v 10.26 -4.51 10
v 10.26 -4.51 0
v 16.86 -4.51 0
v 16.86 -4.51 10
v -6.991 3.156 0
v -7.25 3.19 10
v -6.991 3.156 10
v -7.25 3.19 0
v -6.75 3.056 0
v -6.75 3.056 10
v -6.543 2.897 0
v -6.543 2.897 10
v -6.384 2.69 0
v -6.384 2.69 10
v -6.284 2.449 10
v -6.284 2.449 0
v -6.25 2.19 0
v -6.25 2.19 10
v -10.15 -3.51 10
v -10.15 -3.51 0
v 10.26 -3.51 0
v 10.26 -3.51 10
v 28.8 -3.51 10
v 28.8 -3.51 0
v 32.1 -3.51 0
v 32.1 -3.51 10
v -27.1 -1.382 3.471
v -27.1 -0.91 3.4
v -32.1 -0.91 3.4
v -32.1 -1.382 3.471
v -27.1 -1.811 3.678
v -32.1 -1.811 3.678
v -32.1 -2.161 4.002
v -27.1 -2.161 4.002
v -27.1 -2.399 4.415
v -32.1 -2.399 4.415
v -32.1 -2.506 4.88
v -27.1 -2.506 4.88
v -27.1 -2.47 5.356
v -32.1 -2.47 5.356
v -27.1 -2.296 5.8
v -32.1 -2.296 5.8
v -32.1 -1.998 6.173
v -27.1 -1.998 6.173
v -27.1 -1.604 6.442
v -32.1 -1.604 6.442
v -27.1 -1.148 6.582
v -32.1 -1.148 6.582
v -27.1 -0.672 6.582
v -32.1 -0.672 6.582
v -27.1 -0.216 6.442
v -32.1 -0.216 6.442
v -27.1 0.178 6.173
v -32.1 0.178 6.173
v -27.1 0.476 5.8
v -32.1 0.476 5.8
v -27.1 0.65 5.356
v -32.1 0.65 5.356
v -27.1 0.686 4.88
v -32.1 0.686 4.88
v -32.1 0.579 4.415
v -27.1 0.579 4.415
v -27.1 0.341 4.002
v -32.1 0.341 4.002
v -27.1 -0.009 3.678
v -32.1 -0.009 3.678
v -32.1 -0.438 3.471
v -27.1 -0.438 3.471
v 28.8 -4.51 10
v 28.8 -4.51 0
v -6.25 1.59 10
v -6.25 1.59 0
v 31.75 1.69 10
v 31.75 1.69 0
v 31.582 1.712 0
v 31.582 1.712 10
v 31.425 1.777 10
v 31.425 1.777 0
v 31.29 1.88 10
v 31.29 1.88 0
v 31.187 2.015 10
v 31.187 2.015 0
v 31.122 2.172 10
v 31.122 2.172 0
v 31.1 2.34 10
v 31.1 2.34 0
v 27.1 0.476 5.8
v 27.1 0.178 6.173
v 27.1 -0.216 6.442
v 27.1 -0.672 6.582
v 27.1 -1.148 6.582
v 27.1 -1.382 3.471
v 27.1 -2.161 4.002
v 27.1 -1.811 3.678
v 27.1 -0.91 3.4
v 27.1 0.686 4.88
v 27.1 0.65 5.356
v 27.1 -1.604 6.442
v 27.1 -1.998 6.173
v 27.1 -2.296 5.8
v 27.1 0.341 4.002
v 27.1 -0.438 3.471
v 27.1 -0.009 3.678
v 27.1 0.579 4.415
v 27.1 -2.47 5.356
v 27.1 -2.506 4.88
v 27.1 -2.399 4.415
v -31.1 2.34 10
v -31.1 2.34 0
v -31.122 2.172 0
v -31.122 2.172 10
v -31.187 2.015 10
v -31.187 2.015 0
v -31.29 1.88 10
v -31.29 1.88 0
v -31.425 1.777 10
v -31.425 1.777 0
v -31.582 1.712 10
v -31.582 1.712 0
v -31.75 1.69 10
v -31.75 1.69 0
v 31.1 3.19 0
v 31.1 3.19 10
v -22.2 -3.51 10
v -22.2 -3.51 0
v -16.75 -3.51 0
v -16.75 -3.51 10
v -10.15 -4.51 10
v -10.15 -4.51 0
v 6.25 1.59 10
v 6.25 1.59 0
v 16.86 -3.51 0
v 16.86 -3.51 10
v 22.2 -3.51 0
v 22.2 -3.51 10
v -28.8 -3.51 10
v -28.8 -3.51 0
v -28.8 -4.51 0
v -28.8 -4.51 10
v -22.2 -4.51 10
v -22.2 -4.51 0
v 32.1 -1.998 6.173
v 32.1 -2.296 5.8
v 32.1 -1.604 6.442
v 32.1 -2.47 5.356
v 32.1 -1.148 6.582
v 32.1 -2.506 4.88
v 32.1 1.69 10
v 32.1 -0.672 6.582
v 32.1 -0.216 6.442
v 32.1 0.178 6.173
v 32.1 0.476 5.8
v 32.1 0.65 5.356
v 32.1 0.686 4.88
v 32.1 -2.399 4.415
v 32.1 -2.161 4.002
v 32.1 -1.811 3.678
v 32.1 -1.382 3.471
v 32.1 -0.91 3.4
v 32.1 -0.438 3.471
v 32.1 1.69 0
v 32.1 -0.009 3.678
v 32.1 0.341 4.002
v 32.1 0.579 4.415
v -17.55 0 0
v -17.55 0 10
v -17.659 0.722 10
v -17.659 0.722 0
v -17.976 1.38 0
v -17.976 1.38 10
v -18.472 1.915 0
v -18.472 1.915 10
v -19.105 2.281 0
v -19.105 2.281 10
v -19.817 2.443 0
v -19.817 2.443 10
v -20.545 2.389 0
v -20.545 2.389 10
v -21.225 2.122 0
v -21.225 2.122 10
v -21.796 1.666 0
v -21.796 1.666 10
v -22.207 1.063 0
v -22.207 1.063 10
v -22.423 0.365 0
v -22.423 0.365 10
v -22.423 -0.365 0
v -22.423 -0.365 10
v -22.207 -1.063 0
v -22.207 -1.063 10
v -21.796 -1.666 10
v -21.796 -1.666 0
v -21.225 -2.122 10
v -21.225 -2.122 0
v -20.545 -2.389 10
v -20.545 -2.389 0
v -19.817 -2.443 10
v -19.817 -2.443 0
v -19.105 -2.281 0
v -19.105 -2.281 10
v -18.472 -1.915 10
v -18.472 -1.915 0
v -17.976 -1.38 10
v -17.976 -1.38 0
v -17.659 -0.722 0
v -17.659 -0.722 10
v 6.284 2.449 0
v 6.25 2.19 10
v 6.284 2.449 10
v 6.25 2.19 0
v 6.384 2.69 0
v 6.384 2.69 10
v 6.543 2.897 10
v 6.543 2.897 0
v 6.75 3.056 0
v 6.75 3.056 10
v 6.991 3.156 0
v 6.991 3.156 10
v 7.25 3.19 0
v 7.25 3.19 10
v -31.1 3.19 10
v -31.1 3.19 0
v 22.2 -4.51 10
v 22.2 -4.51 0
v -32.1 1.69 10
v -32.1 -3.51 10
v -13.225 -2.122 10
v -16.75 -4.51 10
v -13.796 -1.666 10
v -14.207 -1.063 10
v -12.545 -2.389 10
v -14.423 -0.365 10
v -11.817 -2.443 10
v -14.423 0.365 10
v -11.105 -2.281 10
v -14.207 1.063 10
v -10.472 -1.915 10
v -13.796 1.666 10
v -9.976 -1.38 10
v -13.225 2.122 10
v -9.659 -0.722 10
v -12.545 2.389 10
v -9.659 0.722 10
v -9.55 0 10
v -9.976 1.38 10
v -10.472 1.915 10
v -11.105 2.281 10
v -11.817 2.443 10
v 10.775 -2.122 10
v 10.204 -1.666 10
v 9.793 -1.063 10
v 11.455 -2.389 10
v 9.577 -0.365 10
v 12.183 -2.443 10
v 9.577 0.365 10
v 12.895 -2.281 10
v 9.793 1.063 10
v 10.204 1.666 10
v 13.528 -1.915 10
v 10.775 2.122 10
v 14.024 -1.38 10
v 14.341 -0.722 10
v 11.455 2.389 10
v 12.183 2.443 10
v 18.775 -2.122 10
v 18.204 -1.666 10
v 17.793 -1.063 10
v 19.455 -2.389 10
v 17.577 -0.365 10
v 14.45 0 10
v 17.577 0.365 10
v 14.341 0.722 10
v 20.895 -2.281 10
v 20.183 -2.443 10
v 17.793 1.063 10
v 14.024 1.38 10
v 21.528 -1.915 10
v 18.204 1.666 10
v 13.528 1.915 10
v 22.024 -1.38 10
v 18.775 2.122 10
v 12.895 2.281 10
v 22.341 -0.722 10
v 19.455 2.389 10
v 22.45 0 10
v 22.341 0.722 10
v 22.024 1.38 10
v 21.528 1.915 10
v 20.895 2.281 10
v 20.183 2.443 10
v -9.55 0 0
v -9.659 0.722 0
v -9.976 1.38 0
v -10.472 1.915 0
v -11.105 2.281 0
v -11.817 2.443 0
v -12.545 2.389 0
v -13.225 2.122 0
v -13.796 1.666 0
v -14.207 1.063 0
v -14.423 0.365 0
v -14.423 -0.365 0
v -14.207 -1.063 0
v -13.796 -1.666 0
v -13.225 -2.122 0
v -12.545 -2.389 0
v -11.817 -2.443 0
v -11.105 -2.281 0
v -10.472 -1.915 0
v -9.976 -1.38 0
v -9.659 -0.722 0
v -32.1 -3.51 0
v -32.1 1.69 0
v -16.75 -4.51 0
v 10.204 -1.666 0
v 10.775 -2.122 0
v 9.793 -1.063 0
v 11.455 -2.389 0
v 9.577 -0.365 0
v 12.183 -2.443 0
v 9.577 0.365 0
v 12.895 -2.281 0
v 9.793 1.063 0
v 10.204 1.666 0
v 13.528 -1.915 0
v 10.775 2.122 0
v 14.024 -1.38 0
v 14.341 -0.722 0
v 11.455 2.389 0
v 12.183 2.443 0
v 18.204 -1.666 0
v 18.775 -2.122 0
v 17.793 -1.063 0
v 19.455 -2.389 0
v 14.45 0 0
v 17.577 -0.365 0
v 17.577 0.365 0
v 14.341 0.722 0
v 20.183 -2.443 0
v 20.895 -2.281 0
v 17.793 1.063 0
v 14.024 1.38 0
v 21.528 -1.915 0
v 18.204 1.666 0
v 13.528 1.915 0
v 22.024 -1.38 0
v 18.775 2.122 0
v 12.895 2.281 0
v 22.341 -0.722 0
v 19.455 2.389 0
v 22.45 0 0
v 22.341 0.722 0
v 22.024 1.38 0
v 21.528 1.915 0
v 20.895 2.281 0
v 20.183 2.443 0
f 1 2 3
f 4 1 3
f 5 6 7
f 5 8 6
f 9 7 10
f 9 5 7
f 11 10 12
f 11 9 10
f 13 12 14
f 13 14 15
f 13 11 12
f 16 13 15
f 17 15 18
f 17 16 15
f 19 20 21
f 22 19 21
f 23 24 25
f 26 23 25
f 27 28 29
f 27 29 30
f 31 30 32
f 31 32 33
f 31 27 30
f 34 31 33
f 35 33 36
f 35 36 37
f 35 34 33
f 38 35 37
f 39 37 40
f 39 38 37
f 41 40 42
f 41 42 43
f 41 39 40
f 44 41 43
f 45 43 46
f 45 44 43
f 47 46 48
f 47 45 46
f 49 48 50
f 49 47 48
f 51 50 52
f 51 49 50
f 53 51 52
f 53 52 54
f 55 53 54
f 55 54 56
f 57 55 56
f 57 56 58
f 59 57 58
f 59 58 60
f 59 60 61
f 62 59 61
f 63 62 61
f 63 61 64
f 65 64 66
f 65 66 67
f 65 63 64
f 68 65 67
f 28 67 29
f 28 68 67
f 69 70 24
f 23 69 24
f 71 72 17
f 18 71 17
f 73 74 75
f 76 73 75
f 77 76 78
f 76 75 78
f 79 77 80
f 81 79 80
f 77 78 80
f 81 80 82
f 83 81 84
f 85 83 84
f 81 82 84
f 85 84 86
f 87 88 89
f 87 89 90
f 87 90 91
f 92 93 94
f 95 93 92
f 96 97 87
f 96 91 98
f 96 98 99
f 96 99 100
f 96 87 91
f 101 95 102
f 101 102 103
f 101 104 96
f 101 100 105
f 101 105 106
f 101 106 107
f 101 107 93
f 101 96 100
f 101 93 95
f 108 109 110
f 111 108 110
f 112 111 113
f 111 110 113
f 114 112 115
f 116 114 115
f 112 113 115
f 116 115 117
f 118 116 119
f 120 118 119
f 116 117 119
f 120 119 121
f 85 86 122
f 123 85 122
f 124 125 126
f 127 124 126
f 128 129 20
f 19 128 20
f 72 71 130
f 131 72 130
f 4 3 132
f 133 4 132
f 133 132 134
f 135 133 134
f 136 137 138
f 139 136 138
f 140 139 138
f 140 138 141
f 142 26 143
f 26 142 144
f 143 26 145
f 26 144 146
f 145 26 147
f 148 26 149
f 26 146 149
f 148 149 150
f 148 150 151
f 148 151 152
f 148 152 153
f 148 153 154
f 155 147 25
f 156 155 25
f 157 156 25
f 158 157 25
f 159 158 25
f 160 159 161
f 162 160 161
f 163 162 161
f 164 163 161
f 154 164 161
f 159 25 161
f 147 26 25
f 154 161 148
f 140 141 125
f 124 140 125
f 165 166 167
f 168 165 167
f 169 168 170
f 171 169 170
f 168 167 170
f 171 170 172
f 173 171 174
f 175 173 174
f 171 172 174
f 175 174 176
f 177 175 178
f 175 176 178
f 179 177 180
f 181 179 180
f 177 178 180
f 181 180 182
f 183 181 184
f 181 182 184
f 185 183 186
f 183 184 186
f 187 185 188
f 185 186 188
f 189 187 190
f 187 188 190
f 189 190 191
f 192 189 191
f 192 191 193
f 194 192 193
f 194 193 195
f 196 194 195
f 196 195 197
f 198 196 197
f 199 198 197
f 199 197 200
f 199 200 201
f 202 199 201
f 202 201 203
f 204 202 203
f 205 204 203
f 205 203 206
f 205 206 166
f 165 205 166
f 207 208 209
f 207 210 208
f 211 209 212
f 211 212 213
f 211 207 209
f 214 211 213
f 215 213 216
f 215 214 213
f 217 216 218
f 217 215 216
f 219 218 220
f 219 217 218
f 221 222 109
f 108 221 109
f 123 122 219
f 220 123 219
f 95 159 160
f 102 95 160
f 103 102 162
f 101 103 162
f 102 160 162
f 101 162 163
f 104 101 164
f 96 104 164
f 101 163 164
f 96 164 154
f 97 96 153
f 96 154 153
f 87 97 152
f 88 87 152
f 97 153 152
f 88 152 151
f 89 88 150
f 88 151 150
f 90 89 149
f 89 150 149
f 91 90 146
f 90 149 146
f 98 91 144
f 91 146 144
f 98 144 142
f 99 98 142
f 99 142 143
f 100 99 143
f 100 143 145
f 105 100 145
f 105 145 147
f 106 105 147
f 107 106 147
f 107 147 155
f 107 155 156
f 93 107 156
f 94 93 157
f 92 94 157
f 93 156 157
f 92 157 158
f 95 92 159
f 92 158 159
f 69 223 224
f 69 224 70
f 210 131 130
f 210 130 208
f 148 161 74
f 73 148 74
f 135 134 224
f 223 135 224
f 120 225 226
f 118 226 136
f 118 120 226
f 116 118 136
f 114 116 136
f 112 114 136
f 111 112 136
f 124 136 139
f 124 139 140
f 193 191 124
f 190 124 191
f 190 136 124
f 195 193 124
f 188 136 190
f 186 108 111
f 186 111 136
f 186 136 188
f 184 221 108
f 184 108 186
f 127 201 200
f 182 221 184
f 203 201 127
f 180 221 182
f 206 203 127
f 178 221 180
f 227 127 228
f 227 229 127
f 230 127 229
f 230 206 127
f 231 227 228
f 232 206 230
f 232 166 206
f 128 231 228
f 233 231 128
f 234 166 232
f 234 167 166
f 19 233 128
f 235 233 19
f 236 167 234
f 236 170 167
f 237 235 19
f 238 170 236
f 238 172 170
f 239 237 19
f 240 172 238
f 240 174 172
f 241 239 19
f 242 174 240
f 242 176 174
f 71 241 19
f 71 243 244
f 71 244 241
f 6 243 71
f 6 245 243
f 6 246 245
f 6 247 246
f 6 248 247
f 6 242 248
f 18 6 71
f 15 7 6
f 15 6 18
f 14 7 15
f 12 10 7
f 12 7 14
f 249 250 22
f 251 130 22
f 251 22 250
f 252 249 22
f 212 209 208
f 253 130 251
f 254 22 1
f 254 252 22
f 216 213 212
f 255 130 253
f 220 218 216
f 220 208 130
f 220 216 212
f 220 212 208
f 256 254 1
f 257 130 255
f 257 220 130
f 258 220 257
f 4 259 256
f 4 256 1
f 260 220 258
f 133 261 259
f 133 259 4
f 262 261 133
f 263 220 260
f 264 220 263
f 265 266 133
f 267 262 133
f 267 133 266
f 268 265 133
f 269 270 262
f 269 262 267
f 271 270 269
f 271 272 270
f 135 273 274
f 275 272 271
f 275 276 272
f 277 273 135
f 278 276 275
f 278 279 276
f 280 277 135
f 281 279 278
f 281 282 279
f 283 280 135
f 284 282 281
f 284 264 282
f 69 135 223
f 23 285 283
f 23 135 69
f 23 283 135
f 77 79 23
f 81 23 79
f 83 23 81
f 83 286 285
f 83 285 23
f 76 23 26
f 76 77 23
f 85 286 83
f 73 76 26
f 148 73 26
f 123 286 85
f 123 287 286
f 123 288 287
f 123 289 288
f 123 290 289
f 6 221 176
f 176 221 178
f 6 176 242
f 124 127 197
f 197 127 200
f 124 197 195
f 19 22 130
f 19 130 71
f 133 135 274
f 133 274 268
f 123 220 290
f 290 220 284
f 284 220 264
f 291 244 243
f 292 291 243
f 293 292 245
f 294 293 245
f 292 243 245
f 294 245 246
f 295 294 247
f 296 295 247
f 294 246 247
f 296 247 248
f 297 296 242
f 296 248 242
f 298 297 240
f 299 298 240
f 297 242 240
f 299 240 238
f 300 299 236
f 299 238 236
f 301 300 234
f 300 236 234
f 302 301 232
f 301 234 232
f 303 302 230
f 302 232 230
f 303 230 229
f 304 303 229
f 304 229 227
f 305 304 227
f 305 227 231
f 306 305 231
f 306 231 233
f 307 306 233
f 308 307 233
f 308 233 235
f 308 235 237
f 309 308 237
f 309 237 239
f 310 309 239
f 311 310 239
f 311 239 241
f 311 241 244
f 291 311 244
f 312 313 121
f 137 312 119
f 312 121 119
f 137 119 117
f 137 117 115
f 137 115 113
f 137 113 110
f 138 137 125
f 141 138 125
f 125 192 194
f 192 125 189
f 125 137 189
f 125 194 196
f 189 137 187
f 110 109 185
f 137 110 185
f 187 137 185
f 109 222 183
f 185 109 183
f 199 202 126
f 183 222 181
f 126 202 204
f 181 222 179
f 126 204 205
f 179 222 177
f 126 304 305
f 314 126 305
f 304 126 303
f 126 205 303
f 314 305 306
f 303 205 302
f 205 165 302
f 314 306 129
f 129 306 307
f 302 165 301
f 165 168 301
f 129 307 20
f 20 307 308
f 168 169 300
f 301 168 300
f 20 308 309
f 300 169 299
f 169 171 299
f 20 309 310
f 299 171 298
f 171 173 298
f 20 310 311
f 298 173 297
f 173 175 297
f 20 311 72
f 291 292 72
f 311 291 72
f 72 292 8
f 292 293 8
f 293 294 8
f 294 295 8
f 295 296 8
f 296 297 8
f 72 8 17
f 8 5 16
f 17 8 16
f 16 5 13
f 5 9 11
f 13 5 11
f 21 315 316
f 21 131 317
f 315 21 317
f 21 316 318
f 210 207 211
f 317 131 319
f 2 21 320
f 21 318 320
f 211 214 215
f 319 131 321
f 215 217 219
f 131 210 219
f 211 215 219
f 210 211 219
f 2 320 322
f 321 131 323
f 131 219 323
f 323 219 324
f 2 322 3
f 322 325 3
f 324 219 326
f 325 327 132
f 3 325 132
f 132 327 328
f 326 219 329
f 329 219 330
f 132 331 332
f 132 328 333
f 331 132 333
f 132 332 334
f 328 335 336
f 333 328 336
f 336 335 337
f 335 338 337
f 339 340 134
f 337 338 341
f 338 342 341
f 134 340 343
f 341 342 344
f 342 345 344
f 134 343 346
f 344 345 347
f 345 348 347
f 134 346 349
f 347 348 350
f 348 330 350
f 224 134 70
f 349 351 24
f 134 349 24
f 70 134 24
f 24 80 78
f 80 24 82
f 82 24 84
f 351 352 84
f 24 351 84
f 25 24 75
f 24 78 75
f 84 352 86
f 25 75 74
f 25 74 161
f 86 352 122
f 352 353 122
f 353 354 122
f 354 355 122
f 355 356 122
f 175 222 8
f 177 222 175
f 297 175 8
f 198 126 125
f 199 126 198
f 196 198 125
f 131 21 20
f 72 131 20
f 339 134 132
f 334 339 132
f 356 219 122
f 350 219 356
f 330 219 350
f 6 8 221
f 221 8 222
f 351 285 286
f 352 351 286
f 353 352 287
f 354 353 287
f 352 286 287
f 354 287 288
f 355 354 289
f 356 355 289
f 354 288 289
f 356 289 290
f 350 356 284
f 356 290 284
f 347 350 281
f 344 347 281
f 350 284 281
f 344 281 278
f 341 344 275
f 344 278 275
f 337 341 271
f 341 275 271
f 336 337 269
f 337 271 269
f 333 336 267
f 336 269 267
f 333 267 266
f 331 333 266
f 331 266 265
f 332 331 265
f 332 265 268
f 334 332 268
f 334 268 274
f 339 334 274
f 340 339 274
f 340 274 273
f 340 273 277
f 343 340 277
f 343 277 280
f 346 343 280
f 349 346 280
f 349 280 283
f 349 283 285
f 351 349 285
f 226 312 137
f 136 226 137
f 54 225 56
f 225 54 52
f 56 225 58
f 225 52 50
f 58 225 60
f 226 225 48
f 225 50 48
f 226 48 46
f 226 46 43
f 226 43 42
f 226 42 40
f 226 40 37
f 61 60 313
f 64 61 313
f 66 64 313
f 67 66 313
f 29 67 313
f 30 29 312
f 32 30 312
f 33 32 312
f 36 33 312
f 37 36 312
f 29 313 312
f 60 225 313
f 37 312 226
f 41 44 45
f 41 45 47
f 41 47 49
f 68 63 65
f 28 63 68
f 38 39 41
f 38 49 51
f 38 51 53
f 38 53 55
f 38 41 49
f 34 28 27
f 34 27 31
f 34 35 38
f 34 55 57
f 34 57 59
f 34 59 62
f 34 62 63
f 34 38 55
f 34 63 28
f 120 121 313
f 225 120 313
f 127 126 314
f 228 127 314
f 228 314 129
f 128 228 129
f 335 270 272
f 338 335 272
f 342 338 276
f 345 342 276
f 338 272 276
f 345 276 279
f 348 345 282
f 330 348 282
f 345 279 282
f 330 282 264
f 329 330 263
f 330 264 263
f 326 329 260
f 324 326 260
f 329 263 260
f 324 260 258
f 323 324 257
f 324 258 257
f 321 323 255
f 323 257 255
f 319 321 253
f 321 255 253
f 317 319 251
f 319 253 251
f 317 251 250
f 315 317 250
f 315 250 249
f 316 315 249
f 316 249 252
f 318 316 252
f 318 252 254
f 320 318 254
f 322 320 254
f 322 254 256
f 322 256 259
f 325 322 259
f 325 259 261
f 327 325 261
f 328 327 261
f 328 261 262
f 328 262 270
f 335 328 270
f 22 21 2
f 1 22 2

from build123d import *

# Parameters (mm, degrees)
BOSS_EXTRUDE1_DEPTH = 10
SKETCH3_R           = 2.45
CUT_EXTRUDE1_DEPTH  = 11
SKETCH4_R           = 1.6
CUT_EXTRUDE2_DEPTH  = 5
CUT_EXTRUDE3_START  = -5
SKETCH5_R           = 1.6
CUT_EXTRUDE3_DEPTH  = 5
SKETCH6_W           = 12.5
SKETCH6_H           = 1.6
CUT_EXTRUDE4_DEPTH  = 11
FILLET1_R           = 1


with BuildPart() as part:
    # Sketch2 → Boss-Extrude1 (new body)
    with BuildSketch(Plane.XY):
        with BuildLine():
            Line((7.861835452, 3.19), (-7.738161553, 3.19))
            Line((-7.738161553, 3.19), (-31.1, 3.19))
            Line((-31.1, 3.19), (-31.1, 2.34))
            ThreePointArc((-31.1, 2.34), (-31.290380592, 1.880380592), (-31.75, 1.69))
            Line((-31.75, 1.69), (-32.1, 1.69))
            Line((-32.1, 1.69), (-32.1, -3.51))
            Line((-32.1, -3.51), (-28.800002213, -3.51))
            Line((-28.800002213, -3.51), (-28.800002213, -4.51))
            Line((-28.800002213, -4.51), (-22.200001624, -4.51))
            Line((-22.200001624, -4.51), (-22.200001624, -3.51))
            Line((-22.200001624, -3.51), (-16.749999161, -3.51))
            Line((-16.749999161, -3.51), (-16.749999161, -4.51))
            Line((-16.749999161, -4.51), (-10.149998572, -4.51))
            Line((-10.149998572, -4.51), (-10.149998572, -3.51))
            Line((-10.149998572, -3.51), (10.25999916, -3.51))
            Line((10.25999916, -3.51), (10.25999916, -4.51))
            Line((10.25999916, -4.51), (16.85999975, -4.51))
            Line((16.85999975, -4.51), (16.85999975, -3.51))
            Line((16.85999975, -3.51), (22.200001602, -3.51))
            Line((22.200001602, -3.51), (22.200001602, -4.51))
            Line((22.200001602, -4.51), (28.800002191, -4.51))
            Line((28.800002191, -4.51), (28.800002191, -3.51))
            Line((28.800002191, -3.51), (32.1, -3.51))
            Line((32.1, -3.51), (32.1, 1.69))
            Line((32.1, 1.69), (31.75, 1.69))
            ThreePointArc((31.75, 1.69), (31.290380592, 1.880380592), (31.1, 2.34))
            Line((31.1, 2.34), (31.1, 3.19))
            Line((31.1, 3.19), (7.861835452, 3.19))
        make_face()
    extrude(amount=BOSS_EXTRUDE1_DEPTH)

    # Sketch3 → Cut-Extrude1 (cut)
    with BuildSketch(Plane.XY.offset(10)):
        with Locations((-20, 0)):
            Circle(SKETCH3_R)
        with Locations((-12, 0)):
            Circle(SKETCH3_R)
        with Locations((12, 0)):
            Circle(SKETCH3_R)
        with Locations((20, 0)):
            Circle(SKETCH3_R)
    extrude(amount=-CUT_EXTRUDE1_DEPTH, mode=Mode.SUBTRACT)

    # Sketch4 → Cut-Extrude2 (cut)
    with BuildSketch(Plane(origin=(32.1, 0, 0), x_dir=(0, 0, -1), z_dir=(1, 0, 0))):
        with Locations((-5, -0.91)):
            Circle(SKETCH4_R)
    extrude(amount=-CUT_EXTRUDE2_DEPTH, mode=Mode.SUBTRACT)

    # Sketch5 → Cut-Extrude3 (cut)
    with BuildSketch(Plane.ZY.offset(32.1).offset(CUT_EXTRUDE3_START)):
        with Locations(Location((5, -0.91, 0), (0, 0, 180))):
            Circle(SKETCH5_R)
    extrude(amount=CUT_EXTRUDE3_DEPTH, mode=Mode.SUBTRACT)

    # Sketch6 → Cut-Extrude4 (cut)
    with BuildSketch(Plane.XY.offset(10)):
        with Locations((0, 2.39)):
            Rectangle(SKETCH6_W, SKETCH6_H)
    extrude(amount=-CUT_EXTRUDE4_DEPTH, mode=Mode.SUBTRACT)

    # Fillet1
    fillet1_edges = [part.edges().sort_by_distance(p)[0] for p in [
        (6.25, 3.19, 5),
        (-6.25, 3.19, 5),
    ]]
    fillet(fillet1_edges, radius=FILLET1_R)


solid = part.part
